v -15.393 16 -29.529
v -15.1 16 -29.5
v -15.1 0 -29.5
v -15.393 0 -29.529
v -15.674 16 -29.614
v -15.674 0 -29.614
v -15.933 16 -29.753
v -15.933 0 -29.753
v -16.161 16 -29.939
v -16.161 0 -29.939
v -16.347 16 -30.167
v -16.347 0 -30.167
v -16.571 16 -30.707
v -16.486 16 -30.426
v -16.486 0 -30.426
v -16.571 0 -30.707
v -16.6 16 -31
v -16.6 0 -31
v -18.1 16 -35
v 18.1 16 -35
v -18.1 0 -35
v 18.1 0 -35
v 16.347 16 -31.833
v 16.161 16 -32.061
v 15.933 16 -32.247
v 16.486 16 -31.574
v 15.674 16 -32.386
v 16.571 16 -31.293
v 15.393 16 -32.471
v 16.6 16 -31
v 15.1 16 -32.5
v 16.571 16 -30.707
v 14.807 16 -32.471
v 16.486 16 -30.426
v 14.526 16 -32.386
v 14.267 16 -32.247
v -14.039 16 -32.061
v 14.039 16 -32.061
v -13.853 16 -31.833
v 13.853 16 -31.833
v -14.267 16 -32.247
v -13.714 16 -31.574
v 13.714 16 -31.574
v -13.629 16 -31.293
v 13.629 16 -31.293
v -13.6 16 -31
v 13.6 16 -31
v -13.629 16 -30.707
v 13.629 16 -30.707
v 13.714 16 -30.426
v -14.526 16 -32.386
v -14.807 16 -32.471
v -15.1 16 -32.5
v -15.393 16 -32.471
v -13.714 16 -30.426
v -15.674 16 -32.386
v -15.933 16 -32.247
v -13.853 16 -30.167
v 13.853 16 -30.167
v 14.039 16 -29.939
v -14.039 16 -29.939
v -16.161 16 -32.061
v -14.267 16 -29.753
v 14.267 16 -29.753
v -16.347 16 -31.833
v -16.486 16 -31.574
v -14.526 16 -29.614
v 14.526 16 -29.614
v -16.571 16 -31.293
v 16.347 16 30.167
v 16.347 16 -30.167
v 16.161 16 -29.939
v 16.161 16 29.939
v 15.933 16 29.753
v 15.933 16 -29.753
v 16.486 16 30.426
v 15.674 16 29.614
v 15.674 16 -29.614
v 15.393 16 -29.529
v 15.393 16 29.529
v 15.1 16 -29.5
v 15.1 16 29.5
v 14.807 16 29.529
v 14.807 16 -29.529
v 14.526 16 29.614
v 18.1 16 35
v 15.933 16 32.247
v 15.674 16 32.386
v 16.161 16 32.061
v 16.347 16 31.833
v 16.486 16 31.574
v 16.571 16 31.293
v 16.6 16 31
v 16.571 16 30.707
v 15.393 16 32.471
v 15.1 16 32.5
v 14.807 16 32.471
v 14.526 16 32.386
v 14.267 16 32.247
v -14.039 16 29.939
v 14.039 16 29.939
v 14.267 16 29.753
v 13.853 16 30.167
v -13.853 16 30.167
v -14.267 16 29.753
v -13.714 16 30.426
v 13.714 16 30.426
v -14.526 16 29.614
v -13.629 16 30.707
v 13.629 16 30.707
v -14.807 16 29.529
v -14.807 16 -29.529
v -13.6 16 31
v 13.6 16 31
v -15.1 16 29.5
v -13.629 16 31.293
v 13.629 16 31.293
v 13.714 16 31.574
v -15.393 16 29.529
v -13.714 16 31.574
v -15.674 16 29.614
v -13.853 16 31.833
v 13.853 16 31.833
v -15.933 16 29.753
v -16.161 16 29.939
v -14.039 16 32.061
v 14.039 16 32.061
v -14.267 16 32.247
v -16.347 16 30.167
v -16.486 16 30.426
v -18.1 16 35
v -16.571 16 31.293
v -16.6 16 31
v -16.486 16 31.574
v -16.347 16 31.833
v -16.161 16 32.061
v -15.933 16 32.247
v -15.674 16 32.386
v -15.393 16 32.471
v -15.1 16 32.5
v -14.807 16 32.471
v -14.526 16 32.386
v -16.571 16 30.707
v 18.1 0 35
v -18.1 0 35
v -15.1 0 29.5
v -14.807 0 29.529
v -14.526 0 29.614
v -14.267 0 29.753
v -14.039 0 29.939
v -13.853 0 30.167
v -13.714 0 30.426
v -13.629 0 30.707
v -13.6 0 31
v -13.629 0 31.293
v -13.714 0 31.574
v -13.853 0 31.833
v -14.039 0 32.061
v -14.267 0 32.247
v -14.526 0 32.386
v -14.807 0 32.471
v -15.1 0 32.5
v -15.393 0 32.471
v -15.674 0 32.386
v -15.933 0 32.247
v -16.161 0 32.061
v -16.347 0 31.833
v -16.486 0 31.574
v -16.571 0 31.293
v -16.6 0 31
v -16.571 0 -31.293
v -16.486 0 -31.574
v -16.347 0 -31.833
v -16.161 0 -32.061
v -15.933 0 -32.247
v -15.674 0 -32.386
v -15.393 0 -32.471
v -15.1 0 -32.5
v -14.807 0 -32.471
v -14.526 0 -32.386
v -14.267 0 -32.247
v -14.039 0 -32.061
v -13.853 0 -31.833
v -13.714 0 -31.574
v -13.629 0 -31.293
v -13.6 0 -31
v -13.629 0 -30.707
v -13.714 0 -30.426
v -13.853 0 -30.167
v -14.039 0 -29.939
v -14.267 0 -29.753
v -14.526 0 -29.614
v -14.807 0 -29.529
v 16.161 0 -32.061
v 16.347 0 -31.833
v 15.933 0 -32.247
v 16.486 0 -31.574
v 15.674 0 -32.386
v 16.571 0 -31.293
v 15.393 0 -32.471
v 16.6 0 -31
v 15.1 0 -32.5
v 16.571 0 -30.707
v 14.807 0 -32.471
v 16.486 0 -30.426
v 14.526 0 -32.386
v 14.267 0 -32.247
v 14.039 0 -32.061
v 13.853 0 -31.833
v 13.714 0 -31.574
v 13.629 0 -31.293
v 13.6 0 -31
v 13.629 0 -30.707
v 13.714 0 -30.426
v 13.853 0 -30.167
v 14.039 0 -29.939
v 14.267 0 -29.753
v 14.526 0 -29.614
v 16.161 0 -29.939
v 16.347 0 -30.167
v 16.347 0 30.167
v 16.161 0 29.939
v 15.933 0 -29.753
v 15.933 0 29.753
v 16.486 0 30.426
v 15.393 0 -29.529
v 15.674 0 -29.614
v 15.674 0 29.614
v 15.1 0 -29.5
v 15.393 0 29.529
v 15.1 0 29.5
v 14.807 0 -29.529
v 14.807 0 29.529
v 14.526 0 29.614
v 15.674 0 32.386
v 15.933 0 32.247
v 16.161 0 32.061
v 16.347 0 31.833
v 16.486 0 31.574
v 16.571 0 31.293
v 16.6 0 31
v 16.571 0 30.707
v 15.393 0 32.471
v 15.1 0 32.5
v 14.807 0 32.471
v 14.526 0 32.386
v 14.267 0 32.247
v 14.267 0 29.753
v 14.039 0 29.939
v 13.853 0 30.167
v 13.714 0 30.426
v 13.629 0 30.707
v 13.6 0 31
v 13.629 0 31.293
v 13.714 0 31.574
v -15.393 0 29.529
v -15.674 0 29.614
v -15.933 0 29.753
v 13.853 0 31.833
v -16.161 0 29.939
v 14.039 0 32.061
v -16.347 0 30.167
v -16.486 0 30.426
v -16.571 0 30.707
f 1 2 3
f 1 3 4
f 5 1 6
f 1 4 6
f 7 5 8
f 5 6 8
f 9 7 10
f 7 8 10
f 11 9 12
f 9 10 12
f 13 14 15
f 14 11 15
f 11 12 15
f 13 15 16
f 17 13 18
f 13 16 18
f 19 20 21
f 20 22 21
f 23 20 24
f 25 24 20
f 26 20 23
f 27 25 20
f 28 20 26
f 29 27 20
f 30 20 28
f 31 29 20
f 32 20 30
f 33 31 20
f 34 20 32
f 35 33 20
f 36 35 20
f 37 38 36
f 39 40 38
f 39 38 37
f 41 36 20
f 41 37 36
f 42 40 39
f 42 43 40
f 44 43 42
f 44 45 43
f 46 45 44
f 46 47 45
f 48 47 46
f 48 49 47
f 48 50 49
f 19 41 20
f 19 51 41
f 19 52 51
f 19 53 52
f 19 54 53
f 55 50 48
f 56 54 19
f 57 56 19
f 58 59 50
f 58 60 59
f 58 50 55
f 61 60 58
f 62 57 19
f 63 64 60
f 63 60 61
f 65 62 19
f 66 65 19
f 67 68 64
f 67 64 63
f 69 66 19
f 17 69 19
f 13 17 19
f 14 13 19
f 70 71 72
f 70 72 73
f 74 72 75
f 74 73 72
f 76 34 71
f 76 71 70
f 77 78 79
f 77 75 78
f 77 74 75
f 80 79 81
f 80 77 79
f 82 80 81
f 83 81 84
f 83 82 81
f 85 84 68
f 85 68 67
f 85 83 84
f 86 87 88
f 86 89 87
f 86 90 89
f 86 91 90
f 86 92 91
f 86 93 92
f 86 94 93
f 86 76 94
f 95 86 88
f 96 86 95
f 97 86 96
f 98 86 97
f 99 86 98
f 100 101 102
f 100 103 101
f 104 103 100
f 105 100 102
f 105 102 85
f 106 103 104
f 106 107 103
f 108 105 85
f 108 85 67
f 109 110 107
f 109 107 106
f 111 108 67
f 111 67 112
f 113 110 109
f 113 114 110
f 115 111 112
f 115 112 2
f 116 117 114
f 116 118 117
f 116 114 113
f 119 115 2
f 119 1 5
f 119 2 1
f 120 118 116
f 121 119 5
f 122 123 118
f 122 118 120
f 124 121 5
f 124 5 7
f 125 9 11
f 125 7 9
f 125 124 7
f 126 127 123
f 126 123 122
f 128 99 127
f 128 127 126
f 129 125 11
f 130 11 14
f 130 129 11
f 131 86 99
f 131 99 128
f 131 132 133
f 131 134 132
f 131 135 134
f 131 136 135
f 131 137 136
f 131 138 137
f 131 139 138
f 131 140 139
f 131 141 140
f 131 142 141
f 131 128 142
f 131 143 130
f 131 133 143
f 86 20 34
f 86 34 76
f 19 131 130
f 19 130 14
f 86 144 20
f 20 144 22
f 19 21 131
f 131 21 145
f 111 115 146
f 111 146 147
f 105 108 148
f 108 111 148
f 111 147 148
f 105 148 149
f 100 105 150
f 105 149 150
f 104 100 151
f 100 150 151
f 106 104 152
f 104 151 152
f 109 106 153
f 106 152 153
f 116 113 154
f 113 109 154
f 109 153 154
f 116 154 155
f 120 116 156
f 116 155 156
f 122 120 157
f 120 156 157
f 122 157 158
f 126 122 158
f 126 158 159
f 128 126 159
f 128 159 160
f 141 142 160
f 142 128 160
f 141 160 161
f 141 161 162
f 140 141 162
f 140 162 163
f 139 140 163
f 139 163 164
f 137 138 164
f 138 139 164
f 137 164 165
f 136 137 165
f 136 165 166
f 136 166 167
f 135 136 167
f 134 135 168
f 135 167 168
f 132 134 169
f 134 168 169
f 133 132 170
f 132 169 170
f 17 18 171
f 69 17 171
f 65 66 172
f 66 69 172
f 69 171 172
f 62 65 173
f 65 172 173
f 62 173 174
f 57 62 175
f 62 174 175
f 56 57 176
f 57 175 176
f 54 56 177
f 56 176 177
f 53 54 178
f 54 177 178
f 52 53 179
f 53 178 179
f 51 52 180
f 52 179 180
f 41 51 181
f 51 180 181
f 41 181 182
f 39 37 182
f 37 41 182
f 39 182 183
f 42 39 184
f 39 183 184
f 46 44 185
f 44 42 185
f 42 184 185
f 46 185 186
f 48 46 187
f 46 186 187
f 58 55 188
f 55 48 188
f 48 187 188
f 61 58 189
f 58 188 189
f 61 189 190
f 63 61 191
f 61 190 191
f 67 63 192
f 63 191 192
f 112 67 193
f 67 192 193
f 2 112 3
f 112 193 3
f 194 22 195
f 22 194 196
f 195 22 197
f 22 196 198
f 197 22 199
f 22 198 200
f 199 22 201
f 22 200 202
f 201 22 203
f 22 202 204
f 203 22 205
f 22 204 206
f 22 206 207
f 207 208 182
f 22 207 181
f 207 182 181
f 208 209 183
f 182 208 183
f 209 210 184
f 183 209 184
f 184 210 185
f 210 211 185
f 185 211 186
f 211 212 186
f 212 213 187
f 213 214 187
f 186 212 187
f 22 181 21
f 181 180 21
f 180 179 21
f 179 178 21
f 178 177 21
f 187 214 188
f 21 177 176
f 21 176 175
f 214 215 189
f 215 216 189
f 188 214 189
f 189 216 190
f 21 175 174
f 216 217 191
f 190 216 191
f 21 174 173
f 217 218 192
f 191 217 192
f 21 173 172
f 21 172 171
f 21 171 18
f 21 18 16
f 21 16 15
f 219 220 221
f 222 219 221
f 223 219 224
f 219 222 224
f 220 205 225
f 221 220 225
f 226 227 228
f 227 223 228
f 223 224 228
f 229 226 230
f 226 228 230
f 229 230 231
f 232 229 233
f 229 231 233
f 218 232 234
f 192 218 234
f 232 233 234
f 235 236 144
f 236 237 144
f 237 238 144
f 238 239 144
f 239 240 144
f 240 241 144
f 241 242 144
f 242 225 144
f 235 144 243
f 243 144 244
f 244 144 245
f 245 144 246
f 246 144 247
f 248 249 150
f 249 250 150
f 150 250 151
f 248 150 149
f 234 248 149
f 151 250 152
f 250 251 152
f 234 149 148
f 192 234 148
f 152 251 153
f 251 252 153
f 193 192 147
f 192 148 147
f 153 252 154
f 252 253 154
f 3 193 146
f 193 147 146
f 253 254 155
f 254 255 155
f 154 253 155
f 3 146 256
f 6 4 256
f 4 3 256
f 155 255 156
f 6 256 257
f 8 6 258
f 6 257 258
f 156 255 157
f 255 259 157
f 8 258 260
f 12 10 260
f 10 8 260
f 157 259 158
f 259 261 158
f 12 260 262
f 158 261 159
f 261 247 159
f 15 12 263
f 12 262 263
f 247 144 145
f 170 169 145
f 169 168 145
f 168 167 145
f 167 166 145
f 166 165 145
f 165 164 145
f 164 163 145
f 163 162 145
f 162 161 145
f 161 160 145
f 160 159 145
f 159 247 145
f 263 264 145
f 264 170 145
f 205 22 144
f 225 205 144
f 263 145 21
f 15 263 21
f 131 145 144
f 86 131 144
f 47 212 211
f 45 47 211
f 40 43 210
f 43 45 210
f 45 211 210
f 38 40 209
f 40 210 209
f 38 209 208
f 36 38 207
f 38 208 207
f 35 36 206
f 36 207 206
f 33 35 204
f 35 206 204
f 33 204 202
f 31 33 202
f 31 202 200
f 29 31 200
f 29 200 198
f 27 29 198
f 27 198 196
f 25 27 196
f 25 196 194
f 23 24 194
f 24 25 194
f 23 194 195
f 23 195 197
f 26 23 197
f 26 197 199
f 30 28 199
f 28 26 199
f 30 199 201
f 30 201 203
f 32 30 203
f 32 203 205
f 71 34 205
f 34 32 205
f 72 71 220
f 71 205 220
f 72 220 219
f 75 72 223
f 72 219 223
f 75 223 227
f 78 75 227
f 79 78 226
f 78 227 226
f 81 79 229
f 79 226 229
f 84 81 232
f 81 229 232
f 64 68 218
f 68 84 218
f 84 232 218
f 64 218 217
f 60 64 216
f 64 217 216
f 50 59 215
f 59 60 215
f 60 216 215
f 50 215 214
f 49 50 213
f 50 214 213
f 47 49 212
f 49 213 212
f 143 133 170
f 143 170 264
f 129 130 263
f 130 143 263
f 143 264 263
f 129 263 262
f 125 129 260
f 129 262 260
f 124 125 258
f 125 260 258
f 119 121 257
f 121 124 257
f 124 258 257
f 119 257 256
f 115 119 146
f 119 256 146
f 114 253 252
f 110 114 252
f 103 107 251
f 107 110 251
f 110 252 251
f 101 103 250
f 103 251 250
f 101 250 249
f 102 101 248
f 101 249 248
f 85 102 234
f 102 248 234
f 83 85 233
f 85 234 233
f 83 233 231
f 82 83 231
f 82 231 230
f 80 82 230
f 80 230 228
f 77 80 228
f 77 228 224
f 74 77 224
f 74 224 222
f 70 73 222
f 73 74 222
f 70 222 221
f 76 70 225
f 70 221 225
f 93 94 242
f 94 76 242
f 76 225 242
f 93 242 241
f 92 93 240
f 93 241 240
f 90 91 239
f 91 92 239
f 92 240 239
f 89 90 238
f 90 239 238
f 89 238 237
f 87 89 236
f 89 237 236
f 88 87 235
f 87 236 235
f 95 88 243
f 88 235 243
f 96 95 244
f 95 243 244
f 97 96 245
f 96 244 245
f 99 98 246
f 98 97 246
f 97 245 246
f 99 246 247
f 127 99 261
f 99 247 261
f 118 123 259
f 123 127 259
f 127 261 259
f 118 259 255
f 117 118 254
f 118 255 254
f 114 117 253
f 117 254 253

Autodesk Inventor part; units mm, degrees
ref_plane "YZ Plane" through (0, 0, 0) normal (1, 0, 0) x (0, 1, 0)
ref_plane "XZ Plane" through (0, 0, 0) normal (0, 1, 0) x (-1, 0, 0)
ref_plane "XY Plane" through (0, 0, 0) normal (0, 0, 1) x (1, 0, 0)
sketch "Эскиз1" plane through (0, 0, 0) normal (0, 1, 0) x (-1, 0, 0)
  line L0 (18.1, 35) -> (-18.1, 35)
  line L1 (-18.1, 35) -> (-18.1, -35)
  line L2 (-18.1, -35) -> (18.1, -35)
  line L3 (18.1, -35) -> (18.1, 35)
  line L4 (18.1, 35) -> (-18.1, -35) construction
  line L5 (15.1, 31) -> (15.1, -31)
  line L6 (0, 0) -> (5, 0) construction
  circle A0 centre (15.1, 31) radius 1.5
  line L7 (0, 0) -> (0, 5) construction
  line L8 (0, 0) -> (3, -3) construction
  circle A1 centre (-15.1, 31) radius 1.5
  circle A2 centre (15.1, -31) radius 1.5
  circle A3 centre (-15.1, -31) radius 1.5
  point P0 (15.1, 0)
  point P1 (-15.5, 0)
  dimension "d0" = 36.2
  dimension "d1" = 70
  dimension "d2" = 4
  dimension "d3" = 3
  dimension "d4" = 3
extrude "Выдавливание1" add sketch "Эскиз1" along normal blind 16
properties part number "boost"
